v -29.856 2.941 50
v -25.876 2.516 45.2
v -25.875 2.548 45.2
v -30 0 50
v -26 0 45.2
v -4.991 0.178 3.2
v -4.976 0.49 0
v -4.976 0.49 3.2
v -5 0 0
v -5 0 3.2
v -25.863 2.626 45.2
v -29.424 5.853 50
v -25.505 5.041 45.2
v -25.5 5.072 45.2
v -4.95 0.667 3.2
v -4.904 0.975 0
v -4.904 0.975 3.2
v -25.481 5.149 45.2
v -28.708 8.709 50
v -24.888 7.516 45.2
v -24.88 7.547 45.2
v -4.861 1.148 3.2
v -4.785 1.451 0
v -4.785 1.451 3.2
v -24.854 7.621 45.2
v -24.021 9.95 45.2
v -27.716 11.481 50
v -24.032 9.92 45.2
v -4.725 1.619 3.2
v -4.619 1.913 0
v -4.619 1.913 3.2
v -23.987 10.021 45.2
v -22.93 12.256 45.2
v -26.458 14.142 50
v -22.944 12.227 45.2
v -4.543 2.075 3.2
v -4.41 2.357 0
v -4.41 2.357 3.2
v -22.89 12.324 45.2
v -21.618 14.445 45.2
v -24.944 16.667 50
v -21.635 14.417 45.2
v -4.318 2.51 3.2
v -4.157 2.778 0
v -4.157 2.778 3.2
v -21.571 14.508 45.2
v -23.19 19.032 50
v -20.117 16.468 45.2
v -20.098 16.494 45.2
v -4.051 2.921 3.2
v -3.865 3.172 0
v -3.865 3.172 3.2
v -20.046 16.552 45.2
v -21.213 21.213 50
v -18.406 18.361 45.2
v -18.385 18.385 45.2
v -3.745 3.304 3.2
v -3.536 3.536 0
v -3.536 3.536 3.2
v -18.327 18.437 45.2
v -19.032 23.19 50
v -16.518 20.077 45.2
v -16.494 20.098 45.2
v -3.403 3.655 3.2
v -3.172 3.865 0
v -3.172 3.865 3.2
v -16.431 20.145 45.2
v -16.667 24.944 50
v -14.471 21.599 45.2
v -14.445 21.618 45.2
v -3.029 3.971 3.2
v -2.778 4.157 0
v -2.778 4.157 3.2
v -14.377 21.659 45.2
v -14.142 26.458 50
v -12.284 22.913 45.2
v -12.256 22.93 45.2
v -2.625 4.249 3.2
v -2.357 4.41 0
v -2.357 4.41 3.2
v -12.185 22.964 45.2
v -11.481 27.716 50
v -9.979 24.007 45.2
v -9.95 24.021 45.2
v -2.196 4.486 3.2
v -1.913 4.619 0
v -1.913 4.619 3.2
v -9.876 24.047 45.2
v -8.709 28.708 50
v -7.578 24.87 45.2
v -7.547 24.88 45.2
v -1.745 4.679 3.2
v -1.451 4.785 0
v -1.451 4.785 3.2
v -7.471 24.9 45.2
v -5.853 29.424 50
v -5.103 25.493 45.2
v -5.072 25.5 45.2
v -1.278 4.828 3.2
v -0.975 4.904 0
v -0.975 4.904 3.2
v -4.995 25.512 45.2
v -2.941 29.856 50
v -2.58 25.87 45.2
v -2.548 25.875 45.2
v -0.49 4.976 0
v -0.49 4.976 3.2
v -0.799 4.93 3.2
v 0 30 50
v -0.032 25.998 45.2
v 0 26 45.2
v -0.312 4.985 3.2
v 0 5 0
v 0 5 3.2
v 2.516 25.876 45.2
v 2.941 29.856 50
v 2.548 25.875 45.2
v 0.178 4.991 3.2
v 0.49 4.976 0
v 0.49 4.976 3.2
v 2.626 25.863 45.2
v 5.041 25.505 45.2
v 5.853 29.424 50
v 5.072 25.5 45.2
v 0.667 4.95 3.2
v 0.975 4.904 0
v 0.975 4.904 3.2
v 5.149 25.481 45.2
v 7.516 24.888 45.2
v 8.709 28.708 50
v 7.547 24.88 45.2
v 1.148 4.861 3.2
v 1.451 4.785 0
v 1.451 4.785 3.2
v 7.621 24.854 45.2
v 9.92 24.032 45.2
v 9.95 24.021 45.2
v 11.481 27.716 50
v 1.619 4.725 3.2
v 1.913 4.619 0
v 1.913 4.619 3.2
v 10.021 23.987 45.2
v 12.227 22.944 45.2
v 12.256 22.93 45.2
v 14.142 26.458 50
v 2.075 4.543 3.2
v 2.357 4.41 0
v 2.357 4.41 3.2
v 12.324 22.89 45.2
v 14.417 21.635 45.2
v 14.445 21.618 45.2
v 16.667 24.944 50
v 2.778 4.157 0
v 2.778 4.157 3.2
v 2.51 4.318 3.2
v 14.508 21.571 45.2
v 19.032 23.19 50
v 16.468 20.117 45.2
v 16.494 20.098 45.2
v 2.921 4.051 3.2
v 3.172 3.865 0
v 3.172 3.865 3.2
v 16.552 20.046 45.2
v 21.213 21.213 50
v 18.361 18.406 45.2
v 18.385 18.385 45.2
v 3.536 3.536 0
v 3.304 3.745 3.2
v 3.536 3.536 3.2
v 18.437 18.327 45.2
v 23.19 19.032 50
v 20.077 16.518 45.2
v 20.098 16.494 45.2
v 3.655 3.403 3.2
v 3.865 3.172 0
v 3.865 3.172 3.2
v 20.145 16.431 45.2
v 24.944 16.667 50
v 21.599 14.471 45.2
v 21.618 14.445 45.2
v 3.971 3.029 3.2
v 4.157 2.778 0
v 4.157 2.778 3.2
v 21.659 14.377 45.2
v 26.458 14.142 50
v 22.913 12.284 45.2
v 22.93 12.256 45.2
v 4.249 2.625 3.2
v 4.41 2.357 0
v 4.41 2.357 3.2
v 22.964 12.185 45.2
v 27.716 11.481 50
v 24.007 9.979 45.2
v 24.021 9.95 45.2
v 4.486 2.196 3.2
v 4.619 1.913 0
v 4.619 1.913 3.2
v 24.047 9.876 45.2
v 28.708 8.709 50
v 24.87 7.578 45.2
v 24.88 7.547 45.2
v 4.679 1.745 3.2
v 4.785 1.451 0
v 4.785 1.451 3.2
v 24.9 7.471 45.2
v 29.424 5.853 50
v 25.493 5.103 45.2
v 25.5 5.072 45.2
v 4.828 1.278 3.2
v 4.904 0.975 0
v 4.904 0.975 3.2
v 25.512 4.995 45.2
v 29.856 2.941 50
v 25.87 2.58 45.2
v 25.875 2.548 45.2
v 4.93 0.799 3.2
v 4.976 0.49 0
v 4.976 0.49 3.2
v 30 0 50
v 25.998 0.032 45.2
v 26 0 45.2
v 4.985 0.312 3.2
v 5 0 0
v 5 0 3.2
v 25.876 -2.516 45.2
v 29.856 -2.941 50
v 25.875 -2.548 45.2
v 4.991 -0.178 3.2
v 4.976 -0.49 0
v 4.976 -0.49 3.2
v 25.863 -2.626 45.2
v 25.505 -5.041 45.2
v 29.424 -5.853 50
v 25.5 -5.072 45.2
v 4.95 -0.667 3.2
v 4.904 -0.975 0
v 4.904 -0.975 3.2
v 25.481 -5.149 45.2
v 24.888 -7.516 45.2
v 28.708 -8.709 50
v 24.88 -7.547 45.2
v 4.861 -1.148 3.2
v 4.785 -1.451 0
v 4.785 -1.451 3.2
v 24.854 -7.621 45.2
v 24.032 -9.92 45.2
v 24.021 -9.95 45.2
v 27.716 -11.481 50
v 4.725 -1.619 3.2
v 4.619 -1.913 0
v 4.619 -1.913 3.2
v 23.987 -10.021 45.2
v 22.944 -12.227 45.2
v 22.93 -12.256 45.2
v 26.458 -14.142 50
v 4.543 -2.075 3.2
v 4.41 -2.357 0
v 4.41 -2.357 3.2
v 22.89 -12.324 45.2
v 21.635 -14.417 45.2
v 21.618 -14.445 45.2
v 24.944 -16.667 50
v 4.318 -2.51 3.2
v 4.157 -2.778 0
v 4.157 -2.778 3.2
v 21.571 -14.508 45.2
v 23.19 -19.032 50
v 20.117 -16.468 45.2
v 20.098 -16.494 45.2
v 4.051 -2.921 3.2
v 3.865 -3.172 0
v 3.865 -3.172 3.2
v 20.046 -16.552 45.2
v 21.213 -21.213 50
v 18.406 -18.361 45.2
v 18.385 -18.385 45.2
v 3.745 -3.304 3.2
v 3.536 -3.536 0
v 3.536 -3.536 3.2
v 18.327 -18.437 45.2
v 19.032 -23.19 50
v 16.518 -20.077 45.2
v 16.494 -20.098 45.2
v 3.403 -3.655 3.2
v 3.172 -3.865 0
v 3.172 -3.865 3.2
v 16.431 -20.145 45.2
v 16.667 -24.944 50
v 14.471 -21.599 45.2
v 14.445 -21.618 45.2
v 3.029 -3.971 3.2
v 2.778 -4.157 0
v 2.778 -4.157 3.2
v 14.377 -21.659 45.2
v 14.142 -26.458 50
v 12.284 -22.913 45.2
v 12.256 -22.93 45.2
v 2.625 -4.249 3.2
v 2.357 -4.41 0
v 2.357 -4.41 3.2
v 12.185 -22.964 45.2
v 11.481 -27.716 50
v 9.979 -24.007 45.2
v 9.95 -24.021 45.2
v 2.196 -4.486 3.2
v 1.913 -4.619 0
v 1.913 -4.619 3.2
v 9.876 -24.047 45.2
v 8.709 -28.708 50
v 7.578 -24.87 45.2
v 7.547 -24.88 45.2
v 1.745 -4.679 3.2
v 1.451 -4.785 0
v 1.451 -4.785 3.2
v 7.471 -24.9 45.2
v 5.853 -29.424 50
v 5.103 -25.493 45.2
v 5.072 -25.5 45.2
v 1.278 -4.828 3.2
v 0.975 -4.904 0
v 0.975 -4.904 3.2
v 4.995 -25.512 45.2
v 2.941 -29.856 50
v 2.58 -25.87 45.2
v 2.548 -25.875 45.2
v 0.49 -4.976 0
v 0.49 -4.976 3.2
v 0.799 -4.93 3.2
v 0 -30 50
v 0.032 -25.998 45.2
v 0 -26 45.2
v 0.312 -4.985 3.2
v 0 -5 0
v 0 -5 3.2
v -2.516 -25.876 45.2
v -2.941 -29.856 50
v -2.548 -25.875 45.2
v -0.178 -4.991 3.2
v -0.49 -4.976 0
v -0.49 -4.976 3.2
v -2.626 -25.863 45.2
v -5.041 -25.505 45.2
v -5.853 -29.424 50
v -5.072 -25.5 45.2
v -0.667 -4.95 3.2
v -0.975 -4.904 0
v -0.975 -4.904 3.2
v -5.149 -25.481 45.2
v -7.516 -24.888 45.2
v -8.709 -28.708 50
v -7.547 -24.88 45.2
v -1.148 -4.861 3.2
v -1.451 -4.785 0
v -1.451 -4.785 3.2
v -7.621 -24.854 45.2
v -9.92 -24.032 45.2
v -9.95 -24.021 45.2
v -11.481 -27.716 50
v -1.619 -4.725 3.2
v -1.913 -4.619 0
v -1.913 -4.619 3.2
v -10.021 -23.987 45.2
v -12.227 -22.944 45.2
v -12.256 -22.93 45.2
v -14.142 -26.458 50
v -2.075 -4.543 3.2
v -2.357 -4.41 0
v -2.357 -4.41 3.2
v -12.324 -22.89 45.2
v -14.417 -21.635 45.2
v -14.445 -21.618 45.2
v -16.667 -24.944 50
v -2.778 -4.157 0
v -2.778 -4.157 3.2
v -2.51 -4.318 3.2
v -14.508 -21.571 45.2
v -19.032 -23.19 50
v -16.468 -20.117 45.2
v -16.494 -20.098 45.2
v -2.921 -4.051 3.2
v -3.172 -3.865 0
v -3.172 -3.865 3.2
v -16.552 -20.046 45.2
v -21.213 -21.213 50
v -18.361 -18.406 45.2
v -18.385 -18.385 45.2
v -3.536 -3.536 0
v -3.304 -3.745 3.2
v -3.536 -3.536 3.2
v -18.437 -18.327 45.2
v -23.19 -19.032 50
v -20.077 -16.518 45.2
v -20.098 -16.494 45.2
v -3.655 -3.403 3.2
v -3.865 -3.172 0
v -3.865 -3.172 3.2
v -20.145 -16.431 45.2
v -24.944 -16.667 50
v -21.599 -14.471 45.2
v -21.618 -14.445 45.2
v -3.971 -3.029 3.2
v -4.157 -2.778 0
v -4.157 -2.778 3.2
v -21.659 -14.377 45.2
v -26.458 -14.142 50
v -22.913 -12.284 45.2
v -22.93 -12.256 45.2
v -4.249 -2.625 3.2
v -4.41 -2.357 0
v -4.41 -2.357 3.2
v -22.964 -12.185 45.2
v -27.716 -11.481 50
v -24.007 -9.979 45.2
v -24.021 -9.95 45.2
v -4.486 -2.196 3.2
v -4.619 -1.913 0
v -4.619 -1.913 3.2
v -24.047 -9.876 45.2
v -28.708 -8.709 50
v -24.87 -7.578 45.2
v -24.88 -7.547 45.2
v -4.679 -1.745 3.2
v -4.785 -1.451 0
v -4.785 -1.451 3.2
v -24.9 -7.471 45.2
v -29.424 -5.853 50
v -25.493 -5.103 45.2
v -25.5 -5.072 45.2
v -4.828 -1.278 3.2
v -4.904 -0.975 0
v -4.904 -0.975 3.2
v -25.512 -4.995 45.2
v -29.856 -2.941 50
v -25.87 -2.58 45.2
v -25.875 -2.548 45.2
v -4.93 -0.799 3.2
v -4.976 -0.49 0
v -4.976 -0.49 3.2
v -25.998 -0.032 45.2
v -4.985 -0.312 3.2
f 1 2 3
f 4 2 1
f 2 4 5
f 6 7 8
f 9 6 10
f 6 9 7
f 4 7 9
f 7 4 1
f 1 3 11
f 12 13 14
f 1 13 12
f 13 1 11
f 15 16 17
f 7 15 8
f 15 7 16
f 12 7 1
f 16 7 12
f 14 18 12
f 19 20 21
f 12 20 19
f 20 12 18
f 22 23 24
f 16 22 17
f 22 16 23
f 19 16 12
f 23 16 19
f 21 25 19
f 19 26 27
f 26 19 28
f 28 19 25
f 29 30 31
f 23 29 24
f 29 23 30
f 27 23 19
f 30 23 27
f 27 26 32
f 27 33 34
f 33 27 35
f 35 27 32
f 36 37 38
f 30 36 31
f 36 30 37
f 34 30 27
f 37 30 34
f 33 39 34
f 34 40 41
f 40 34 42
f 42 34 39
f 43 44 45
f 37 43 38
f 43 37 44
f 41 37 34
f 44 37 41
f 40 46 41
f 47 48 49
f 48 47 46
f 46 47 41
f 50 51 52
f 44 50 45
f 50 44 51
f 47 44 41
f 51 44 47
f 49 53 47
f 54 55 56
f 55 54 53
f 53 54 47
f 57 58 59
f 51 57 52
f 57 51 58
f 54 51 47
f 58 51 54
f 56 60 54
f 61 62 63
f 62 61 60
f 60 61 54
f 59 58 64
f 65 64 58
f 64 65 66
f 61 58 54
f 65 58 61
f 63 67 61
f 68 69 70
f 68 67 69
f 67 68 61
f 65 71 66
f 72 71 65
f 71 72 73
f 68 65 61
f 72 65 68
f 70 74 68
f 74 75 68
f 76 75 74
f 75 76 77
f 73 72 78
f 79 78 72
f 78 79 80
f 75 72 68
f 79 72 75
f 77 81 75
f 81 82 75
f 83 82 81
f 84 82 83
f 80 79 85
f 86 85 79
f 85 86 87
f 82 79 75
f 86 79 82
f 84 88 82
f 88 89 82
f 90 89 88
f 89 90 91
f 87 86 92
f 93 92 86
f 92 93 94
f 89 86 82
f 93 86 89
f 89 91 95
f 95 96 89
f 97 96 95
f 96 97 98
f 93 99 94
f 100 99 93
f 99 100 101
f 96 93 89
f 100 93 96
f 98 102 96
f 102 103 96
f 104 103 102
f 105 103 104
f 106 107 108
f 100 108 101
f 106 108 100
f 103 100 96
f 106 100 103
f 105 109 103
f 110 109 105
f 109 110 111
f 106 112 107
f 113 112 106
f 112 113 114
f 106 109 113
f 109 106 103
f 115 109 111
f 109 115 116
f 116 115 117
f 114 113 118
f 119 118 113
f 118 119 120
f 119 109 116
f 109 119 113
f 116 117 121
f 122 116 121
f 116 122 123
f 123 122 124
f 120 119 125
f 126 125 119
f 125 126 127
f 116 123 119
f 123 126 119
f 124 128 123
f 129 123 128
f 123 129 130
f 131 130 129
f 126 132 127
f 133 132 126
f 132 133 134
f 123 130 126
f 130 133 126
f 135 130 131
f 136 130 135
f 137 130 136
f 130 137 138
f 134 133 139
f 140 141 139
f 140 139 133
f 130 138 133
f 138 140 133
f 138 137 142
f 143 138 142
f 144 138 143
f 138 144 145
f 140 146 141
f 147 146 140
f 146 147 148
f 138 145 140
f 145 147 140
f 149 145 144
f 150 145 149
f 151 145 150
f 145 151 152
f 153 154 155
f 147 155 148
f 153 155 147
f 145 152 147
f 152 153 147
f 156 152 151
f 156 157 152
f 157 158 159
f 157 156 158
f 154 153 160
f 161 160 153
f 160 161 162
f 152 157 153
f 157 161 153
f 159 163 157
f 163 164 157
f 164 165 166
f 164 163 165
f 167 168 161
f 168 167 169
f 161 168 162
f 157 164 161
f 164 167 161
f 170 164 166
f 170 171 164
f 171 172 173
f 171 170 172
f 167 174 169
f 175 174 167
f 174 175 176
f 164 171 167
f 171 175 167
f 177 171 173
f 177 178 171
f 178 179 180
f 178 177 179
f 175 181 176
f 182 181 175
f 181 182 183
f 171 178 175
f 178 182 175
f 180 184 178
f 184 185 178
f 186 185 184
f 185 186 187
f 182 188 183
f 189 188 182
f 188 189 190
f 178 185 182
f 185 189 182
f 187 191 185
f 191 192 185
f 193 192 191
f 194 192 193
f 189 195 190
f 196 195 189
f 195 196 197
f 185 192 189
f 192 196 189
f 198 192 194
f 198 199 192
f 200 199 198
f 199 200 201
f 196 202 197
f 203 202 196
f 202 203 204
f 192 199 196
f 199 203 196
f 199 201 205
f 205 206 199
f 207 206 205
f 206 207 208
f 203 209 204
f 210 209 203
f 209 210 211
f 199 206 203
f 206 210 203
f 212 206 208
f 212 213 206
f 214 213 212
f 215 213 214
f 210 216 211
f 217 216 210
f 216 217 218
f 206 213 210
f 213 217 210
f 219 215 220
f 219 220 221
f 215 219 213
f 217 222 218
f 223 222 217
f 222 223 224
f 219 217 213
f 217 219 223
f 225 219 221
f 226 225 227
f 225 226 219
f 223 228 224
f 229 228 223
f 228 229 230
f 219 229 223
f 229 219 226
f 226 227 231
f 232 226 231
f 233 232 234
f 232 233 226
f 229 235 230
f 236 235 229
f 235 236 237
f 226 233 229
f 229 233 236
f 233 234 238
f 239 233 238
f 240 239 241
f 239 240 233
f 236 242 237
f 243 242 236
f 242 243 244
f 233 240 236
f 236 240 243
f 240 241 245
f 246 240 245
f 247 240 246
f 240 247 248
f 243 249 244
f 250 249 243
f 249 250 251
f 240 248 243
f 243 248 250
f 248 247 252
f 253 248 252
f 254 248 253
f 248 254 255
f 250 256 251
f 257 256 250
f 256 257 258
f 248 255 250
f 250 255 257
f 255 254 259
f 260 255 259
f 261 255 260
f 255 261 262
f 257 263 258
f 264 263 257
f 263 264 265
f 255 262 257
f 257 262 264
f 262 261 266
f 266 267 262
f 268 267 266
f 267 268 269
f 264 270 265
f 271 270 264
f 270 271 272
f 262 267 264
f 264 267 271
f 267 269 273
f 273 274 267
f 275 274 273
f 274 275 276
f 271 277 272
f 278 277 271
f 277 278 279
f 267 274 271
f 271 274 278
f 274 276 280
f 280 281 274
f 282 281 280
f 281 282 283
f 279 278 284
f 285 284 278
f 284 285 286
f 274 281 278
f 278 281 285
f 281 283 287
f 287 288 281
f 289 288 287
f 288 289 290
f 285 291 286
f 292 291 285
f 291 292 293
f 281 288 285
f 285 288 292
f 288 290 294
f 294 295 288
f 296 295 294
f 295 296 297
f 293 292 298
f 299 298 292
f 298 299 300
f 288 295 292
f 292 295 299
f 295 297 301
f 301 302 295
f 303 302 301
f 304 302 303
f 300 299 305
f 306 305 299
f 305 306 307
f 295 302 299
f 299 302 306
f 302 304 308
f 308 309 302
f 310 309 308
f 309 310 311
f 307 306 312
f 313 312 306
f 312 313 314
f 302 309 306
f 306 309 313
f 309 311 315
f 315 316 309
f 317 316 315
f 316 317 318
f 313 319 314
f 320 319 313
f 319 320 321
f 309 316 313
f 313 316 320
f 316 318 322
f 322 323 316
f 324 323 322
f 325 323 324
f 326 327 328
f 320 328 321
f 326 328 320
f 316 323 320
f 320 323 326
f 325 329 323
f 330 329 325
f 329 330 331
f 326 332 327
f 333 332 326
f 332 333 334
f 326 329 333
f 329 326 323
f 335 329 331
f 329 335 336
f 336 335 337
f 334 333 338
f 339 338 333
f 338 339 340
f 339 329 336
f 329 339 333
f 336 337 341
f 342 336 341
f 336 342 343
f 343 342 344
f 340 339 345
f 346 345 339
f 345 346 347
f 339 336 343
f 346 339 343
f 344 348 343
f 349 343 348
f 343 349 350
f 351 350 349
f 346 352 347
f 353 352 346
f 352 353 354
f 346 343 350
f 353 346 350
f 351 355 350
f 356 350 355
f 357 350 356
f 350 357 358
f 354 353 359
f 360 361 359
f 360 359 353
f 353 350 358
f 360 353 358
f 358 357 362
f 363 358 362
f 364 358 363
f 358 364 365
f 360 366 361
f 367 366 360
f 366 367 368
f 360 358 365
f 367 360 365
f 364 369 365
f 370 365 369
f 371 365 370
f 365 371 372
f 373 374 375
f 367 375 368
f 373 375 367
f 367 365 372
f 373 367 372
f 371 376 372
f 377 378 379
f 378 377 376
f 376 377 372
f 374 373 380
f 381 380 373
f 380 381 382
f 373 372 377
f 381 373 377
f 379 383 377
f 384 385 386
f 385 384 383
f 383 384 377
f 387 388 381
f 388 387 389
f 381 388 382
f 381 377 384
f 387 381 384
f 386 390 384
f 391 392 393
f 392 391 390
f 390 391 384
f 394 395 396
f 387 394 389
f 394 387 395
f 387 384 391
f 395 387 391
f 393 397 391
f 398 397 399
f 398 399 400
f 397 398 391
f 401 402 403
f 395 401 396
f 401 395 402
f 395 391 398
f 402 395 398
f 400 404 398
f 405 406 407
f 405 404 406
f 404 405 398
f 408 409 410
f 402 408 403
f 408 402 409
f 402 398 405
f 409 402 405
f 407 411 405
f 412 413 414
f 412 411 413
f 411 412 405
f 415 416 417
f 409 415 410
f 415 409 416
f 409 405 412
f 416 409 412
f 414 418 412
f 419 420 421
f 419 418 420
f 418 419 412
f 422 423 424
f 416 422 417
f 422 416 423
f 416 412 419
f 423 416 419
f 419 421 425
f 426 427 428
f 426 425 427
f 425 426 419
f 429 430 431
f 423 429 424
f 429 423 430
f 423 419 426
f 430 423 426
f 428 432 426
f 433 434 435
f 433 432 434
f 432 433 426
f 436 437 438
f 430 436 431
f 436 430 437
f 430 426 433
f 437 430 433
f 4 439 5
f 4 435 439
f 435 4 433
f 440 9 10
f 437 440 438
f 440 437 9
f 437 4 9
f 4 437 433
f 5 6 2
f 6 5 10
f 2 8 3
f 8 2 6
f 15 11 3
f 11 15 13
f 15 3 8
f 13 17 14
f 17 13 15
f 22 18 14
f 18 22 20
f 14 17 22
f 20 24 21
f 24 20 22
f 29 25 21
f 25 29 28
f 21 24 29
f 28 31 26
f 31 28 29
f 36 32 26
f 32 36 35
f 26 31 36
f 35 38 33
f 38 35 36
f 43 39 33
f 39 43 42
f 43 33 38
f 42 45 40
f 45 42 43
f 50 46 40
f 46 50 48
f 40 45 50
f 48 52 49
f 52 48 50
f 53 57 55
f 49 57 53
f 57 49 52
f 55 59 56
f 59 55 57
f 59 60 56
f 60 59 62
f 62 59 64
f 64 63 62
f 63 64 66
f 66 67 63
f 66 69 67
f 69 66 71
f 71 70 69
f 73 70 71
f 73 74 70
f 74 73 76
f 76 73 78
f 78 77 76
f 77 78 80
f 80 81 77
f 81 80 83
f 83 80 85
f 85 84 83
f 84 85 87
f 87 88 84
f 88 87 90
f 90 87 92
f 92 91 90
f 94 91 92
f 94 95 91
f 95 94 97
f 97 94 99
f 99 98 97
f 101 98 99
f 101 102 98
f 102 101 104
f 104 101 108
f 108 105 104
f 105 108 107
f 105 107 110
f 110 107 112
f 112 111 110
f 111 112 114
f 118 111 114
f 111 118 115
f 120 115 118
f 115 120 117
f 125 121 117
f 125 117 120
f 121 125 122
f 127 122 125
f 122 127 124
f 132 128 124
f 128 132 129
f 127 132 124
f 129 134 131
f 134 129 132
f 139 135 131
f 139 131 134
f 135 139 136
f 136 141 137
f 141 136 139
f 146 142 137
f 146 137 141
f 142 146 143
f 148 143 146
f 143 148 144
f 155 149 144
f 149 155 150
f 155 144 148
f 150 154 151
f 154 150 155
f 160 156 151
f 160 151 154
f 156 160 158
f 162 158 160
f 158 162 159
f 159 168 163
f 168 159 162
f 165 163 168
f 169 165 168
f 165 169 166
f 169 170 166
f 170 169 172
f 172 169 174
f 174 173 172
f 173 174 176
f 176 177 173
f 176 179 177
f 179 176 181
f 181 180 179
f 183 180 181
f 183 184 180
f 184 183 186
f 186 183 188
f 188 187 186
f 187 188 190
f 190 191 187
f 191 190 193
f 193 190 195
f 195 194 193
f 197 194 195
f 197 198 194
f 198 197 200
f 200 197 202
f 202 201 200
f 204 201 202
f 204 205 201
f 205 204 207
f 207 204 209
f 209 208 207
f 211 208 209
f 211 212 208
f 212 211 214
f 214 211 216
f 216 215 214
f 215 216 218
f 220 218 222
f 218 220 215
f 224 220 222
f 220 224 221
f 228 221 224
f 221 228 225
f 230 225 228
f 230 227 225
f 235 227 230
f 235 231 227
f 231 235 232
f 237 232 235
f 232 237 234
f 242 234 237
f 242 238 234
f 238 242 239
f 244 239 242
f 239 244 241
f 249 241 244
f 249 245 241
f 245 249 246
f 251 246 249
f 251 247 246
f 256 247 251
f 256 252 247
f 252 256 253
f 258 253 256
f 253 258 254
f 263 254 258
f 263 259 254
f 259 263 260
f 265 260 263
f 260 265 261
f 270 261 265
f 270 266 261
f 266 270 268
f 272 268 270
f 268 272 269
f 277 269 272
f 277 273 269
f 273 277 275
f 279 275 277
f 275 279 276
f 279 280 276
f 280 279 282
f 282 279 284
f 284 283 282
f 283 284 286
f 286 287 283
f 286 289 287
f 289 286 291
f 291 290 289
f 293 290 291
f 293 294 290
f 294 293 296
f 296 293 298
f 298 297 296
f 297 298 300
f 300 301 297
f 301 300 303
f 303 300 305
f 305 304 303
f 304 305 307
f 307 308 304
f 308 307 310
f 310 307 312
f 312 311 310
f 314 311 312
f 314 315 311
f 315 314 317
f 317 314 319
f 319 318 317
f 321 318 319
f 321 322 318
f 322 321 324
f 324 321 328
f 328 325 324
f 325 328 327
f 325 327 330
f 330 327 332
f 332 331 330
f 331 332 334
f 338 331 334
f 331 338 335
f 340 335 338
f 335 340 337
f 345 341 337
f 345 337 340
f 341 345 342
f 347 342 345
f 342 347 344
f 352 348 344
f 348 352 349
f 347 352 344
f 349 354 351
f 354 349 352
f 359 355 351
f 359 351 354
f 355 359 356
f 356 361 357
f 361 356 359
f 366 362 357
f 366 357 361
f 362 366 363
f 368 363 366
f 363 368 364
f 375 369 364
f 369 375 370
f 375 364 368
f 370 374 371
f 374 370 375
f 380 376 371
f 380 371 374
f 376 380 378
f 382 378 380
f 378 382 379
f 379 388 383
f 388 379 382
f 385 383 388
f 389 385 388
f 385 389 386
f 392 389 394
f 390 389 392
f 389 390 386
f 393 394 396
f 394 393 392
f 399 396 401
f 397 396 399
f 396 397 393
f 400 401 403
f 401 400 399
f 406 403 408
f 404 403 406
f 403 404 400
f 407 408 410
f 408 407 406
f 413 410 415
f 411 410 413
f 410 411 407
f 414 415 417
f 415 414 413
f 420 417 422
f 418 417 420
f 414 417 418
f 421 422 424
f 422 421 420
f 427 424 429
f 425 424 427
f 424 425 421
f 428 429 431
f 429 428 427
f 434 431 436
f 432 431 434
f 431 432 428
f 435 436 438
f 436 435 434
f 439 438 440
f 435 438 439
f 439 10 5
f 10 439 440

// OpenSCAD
// Lab funnel parameters
$fn = 64;

// Dimensions
spout_outer_diameter = 10;           // mm
spout_length = 20;                       // mm from z=0 to z=20
cone_base_diameter = 10;               // mm at z=20 (same as spout)
cone_top_diameter = 60;                // mm at z=50 (rim)
cone_height = 30;                      // mm from z=20 to z=50
wall_thickness = 1.6;                    // mm everywhere

// Derived dimensions
spout_inner_diameter = spout_outer_diameter - 2 * wall_thickness; // 10 - 3.2 = 6.8 mm
cone_inner_base_diameter = cone_base_diameter - 2 * wall_thickness; // 10 - 3.2 = 6.8 mm
cone_inner_top_diameter = cone_top_diameter - 2 * wall_thickness; // 60 - 3.2 = 56.8 mm

// The issue: the spout is only 20 mm long, but the funnel's cone starts at z=20.
// The current model has the cone starting at z=20, but the inner bore is not properly aligned.
// The measurement report shows that at z=1.00, 10.00, 19.00, the outer diameter is 9.99 mm — almost 10 mm.
// That's correct for the spout. But the cone should start at z=20 and widen to 60 mm at z=50.
// However, the current model uses a rotate_extrude for the cone that is not properly aligned with the spout.
// The problem is that the rotate_extrude of the cone is placed at z=20, but the inner bore is subtracted from the same region.
// But the issue is that the inner bore of the cone is not properly connected to the spout's inner bore.
// The current model has a discontinuity: the inner bore of the cone is a separate rotate_extrude, but it's not aligned with the spout's inner bore.
// We must ensure that the inner bore is continuous from z=0 to z=50.

// Fix: Use a single continuous inner bore from z=0 to z=50.
// The inner bore has:
//   - From z=0 to z=20: constant diameter = spout_inner_diameter = 6.8 mm
//   - From z=20 to z=50: tapers from 6.8 mm to 56.8 mm

// Similarly, the outer shape:
//   - From z=0 to z=20: constant diameter = 10 mm
//   - From z=20 to z=50: tapers from 10 mm to 60 mm

// We'll build the funnel as:
//   - Outer shape: spout (cylinder) + cone (tapered)
//   - Inner bore: spout (cylinder) + cone (tapered) with inner dimensions
//   - Use difference to subtract the inner bore from the outer

// But we can't use rotate_extrude for both parts independently because of alignment.
// Instead, we'll define the outer and inner profiles as separate polygons and use rotate_extrude.

// However, a better approach: use a single difference operation with two parts:
//   - The outer body: a solid from z=0 to z=50 with outer profile
//   - The inner bore: a solid from z=0 to z=50 with inner profile

// We'll use a for loop to build the profile for the outer and inner, but that's complex.
// Alternative: use a polyhedron or use a single rotate_extrude for the entire funnel.

// Simpler: define the outer and inner profiles as polygons that are extruded with rotate_extrude.
// But we need two separate profiles: one for outer, one for inner.

// Let's define the outer profile as a polygon that goes from (5, 0) to (30, 30) for the cone, but we need to combine with spout.

// We'll build the funnel as:
//   - A solid outer shape: spout (cylinder) + cone (tapered)
//   - A solid inner bore: spout (cylinder) + cone (tapered with inner diameters)
//   - Then difference: outer minus inner

// But the inner bore must be continuous. So we define the inner bore as a single shape.

// We'll use a rotate_extrude for the inner bore that spans from z=0 to z=50.
// The inner bore has:
//   - From z=0 to z=20: radius = 6.8 / 2 = 3.4 mm
//   - From z=20 to z=50: radius increases from 3.4 to 28.4 mm (since 56.8 / 2 = 28.4)

// So we define a polygon for the inner profile:
//   - At z=0: (3.4, 0)
//   - At z=20: (3.4, 20)  [same radius]
//   - At z=50: (28.4, 50)

// But we can't do that with a single rotate_extrude unless we use a polygon with multiple points.

// We'll define the inner profile as a polygon with three points:
//   - (3.4, 0)
//   - (3.4, 20)
//   - (28.4, 50)

// But that would create a flat top at z=20, which is not what we want.
// We want a continuous taper from z=20 to z=50, but the inner bore at z=20 must be 3.4 mm radius.

// Actually, the inner bore should be:
//   - From z=0 to z=20: constant radius 3.4 mm
//   - From z=20 to z=50: linear increase from 3.4 mm to 28.4 mm

// So the profile is:
//   - (3.4, 0)
//   - (3.4, 20)
//   - (28.4, 50)

// But that would make the inner bore have a flat section from z=0 to z=20, then a taper from z=20 to z=50.
// That's correct.

// Similarly, the outer profile:
//   - (5, 0)
//   - (5, 20)
//   - (30, 50)

// But we can't use a single rotate_extrude for both. We need to do:
//   - Outer: a rotate_extrude of the outer profile polygon
//   - Inner: a rotate_extrude of the inner profile polygon
//   - Then difference: outer minus inner

// But the rotate_extrude will be from z=0 to z=50, but the inner profile has a discontinuity at z=20? No, it's continuous.

// However, the rotate_extrude will create a solid from the polygon. The polygon is in the xz plane, and we rotate around the z-axis.

// Let's do it.

module funnel() {
    // Outer profile: from z=0 to z=50
    // - At z=0: radius = 5 mm
    // - At z=20: radius = 5 mm (flat)
    // - At z=50: radius = 30 mm
    // So the outer profile is a polygon with points:
    outer_profile = [
        [5, 0],
        [5, 20],
        [30, 50]
    ];
    
    // Inner profile: from z=0 to z=50
    // - At z=0: radius = 3.4 mm
    // - At z=20: radius = 3.4 mm
    // - At z=50: radius = 28.4 mm
    inner_profile = [
        [3.4, 0],
        [3.4, 20],
        [28.4, 50]
    ];
    
    // Create outer solid: rotate_extrude of outer_profile
    // But rotate_extrude creates a solid by rotating around the z-axis.
    // We need to make sure the profile is in the xz plane.
    // We'll use rotate_extrude() with the polygon.
    
    difference() {
        // Outer body: rotate_extrude of outer_profile
        rotate_extrude() {
            polygon(outer_profile);
        }
        
        // Inner bore: rotate_extrude of inner_profile
        rotate_extrude() {
            polygon(inner_profile);
        }
    }
}

// Render the funnel
funnel();
